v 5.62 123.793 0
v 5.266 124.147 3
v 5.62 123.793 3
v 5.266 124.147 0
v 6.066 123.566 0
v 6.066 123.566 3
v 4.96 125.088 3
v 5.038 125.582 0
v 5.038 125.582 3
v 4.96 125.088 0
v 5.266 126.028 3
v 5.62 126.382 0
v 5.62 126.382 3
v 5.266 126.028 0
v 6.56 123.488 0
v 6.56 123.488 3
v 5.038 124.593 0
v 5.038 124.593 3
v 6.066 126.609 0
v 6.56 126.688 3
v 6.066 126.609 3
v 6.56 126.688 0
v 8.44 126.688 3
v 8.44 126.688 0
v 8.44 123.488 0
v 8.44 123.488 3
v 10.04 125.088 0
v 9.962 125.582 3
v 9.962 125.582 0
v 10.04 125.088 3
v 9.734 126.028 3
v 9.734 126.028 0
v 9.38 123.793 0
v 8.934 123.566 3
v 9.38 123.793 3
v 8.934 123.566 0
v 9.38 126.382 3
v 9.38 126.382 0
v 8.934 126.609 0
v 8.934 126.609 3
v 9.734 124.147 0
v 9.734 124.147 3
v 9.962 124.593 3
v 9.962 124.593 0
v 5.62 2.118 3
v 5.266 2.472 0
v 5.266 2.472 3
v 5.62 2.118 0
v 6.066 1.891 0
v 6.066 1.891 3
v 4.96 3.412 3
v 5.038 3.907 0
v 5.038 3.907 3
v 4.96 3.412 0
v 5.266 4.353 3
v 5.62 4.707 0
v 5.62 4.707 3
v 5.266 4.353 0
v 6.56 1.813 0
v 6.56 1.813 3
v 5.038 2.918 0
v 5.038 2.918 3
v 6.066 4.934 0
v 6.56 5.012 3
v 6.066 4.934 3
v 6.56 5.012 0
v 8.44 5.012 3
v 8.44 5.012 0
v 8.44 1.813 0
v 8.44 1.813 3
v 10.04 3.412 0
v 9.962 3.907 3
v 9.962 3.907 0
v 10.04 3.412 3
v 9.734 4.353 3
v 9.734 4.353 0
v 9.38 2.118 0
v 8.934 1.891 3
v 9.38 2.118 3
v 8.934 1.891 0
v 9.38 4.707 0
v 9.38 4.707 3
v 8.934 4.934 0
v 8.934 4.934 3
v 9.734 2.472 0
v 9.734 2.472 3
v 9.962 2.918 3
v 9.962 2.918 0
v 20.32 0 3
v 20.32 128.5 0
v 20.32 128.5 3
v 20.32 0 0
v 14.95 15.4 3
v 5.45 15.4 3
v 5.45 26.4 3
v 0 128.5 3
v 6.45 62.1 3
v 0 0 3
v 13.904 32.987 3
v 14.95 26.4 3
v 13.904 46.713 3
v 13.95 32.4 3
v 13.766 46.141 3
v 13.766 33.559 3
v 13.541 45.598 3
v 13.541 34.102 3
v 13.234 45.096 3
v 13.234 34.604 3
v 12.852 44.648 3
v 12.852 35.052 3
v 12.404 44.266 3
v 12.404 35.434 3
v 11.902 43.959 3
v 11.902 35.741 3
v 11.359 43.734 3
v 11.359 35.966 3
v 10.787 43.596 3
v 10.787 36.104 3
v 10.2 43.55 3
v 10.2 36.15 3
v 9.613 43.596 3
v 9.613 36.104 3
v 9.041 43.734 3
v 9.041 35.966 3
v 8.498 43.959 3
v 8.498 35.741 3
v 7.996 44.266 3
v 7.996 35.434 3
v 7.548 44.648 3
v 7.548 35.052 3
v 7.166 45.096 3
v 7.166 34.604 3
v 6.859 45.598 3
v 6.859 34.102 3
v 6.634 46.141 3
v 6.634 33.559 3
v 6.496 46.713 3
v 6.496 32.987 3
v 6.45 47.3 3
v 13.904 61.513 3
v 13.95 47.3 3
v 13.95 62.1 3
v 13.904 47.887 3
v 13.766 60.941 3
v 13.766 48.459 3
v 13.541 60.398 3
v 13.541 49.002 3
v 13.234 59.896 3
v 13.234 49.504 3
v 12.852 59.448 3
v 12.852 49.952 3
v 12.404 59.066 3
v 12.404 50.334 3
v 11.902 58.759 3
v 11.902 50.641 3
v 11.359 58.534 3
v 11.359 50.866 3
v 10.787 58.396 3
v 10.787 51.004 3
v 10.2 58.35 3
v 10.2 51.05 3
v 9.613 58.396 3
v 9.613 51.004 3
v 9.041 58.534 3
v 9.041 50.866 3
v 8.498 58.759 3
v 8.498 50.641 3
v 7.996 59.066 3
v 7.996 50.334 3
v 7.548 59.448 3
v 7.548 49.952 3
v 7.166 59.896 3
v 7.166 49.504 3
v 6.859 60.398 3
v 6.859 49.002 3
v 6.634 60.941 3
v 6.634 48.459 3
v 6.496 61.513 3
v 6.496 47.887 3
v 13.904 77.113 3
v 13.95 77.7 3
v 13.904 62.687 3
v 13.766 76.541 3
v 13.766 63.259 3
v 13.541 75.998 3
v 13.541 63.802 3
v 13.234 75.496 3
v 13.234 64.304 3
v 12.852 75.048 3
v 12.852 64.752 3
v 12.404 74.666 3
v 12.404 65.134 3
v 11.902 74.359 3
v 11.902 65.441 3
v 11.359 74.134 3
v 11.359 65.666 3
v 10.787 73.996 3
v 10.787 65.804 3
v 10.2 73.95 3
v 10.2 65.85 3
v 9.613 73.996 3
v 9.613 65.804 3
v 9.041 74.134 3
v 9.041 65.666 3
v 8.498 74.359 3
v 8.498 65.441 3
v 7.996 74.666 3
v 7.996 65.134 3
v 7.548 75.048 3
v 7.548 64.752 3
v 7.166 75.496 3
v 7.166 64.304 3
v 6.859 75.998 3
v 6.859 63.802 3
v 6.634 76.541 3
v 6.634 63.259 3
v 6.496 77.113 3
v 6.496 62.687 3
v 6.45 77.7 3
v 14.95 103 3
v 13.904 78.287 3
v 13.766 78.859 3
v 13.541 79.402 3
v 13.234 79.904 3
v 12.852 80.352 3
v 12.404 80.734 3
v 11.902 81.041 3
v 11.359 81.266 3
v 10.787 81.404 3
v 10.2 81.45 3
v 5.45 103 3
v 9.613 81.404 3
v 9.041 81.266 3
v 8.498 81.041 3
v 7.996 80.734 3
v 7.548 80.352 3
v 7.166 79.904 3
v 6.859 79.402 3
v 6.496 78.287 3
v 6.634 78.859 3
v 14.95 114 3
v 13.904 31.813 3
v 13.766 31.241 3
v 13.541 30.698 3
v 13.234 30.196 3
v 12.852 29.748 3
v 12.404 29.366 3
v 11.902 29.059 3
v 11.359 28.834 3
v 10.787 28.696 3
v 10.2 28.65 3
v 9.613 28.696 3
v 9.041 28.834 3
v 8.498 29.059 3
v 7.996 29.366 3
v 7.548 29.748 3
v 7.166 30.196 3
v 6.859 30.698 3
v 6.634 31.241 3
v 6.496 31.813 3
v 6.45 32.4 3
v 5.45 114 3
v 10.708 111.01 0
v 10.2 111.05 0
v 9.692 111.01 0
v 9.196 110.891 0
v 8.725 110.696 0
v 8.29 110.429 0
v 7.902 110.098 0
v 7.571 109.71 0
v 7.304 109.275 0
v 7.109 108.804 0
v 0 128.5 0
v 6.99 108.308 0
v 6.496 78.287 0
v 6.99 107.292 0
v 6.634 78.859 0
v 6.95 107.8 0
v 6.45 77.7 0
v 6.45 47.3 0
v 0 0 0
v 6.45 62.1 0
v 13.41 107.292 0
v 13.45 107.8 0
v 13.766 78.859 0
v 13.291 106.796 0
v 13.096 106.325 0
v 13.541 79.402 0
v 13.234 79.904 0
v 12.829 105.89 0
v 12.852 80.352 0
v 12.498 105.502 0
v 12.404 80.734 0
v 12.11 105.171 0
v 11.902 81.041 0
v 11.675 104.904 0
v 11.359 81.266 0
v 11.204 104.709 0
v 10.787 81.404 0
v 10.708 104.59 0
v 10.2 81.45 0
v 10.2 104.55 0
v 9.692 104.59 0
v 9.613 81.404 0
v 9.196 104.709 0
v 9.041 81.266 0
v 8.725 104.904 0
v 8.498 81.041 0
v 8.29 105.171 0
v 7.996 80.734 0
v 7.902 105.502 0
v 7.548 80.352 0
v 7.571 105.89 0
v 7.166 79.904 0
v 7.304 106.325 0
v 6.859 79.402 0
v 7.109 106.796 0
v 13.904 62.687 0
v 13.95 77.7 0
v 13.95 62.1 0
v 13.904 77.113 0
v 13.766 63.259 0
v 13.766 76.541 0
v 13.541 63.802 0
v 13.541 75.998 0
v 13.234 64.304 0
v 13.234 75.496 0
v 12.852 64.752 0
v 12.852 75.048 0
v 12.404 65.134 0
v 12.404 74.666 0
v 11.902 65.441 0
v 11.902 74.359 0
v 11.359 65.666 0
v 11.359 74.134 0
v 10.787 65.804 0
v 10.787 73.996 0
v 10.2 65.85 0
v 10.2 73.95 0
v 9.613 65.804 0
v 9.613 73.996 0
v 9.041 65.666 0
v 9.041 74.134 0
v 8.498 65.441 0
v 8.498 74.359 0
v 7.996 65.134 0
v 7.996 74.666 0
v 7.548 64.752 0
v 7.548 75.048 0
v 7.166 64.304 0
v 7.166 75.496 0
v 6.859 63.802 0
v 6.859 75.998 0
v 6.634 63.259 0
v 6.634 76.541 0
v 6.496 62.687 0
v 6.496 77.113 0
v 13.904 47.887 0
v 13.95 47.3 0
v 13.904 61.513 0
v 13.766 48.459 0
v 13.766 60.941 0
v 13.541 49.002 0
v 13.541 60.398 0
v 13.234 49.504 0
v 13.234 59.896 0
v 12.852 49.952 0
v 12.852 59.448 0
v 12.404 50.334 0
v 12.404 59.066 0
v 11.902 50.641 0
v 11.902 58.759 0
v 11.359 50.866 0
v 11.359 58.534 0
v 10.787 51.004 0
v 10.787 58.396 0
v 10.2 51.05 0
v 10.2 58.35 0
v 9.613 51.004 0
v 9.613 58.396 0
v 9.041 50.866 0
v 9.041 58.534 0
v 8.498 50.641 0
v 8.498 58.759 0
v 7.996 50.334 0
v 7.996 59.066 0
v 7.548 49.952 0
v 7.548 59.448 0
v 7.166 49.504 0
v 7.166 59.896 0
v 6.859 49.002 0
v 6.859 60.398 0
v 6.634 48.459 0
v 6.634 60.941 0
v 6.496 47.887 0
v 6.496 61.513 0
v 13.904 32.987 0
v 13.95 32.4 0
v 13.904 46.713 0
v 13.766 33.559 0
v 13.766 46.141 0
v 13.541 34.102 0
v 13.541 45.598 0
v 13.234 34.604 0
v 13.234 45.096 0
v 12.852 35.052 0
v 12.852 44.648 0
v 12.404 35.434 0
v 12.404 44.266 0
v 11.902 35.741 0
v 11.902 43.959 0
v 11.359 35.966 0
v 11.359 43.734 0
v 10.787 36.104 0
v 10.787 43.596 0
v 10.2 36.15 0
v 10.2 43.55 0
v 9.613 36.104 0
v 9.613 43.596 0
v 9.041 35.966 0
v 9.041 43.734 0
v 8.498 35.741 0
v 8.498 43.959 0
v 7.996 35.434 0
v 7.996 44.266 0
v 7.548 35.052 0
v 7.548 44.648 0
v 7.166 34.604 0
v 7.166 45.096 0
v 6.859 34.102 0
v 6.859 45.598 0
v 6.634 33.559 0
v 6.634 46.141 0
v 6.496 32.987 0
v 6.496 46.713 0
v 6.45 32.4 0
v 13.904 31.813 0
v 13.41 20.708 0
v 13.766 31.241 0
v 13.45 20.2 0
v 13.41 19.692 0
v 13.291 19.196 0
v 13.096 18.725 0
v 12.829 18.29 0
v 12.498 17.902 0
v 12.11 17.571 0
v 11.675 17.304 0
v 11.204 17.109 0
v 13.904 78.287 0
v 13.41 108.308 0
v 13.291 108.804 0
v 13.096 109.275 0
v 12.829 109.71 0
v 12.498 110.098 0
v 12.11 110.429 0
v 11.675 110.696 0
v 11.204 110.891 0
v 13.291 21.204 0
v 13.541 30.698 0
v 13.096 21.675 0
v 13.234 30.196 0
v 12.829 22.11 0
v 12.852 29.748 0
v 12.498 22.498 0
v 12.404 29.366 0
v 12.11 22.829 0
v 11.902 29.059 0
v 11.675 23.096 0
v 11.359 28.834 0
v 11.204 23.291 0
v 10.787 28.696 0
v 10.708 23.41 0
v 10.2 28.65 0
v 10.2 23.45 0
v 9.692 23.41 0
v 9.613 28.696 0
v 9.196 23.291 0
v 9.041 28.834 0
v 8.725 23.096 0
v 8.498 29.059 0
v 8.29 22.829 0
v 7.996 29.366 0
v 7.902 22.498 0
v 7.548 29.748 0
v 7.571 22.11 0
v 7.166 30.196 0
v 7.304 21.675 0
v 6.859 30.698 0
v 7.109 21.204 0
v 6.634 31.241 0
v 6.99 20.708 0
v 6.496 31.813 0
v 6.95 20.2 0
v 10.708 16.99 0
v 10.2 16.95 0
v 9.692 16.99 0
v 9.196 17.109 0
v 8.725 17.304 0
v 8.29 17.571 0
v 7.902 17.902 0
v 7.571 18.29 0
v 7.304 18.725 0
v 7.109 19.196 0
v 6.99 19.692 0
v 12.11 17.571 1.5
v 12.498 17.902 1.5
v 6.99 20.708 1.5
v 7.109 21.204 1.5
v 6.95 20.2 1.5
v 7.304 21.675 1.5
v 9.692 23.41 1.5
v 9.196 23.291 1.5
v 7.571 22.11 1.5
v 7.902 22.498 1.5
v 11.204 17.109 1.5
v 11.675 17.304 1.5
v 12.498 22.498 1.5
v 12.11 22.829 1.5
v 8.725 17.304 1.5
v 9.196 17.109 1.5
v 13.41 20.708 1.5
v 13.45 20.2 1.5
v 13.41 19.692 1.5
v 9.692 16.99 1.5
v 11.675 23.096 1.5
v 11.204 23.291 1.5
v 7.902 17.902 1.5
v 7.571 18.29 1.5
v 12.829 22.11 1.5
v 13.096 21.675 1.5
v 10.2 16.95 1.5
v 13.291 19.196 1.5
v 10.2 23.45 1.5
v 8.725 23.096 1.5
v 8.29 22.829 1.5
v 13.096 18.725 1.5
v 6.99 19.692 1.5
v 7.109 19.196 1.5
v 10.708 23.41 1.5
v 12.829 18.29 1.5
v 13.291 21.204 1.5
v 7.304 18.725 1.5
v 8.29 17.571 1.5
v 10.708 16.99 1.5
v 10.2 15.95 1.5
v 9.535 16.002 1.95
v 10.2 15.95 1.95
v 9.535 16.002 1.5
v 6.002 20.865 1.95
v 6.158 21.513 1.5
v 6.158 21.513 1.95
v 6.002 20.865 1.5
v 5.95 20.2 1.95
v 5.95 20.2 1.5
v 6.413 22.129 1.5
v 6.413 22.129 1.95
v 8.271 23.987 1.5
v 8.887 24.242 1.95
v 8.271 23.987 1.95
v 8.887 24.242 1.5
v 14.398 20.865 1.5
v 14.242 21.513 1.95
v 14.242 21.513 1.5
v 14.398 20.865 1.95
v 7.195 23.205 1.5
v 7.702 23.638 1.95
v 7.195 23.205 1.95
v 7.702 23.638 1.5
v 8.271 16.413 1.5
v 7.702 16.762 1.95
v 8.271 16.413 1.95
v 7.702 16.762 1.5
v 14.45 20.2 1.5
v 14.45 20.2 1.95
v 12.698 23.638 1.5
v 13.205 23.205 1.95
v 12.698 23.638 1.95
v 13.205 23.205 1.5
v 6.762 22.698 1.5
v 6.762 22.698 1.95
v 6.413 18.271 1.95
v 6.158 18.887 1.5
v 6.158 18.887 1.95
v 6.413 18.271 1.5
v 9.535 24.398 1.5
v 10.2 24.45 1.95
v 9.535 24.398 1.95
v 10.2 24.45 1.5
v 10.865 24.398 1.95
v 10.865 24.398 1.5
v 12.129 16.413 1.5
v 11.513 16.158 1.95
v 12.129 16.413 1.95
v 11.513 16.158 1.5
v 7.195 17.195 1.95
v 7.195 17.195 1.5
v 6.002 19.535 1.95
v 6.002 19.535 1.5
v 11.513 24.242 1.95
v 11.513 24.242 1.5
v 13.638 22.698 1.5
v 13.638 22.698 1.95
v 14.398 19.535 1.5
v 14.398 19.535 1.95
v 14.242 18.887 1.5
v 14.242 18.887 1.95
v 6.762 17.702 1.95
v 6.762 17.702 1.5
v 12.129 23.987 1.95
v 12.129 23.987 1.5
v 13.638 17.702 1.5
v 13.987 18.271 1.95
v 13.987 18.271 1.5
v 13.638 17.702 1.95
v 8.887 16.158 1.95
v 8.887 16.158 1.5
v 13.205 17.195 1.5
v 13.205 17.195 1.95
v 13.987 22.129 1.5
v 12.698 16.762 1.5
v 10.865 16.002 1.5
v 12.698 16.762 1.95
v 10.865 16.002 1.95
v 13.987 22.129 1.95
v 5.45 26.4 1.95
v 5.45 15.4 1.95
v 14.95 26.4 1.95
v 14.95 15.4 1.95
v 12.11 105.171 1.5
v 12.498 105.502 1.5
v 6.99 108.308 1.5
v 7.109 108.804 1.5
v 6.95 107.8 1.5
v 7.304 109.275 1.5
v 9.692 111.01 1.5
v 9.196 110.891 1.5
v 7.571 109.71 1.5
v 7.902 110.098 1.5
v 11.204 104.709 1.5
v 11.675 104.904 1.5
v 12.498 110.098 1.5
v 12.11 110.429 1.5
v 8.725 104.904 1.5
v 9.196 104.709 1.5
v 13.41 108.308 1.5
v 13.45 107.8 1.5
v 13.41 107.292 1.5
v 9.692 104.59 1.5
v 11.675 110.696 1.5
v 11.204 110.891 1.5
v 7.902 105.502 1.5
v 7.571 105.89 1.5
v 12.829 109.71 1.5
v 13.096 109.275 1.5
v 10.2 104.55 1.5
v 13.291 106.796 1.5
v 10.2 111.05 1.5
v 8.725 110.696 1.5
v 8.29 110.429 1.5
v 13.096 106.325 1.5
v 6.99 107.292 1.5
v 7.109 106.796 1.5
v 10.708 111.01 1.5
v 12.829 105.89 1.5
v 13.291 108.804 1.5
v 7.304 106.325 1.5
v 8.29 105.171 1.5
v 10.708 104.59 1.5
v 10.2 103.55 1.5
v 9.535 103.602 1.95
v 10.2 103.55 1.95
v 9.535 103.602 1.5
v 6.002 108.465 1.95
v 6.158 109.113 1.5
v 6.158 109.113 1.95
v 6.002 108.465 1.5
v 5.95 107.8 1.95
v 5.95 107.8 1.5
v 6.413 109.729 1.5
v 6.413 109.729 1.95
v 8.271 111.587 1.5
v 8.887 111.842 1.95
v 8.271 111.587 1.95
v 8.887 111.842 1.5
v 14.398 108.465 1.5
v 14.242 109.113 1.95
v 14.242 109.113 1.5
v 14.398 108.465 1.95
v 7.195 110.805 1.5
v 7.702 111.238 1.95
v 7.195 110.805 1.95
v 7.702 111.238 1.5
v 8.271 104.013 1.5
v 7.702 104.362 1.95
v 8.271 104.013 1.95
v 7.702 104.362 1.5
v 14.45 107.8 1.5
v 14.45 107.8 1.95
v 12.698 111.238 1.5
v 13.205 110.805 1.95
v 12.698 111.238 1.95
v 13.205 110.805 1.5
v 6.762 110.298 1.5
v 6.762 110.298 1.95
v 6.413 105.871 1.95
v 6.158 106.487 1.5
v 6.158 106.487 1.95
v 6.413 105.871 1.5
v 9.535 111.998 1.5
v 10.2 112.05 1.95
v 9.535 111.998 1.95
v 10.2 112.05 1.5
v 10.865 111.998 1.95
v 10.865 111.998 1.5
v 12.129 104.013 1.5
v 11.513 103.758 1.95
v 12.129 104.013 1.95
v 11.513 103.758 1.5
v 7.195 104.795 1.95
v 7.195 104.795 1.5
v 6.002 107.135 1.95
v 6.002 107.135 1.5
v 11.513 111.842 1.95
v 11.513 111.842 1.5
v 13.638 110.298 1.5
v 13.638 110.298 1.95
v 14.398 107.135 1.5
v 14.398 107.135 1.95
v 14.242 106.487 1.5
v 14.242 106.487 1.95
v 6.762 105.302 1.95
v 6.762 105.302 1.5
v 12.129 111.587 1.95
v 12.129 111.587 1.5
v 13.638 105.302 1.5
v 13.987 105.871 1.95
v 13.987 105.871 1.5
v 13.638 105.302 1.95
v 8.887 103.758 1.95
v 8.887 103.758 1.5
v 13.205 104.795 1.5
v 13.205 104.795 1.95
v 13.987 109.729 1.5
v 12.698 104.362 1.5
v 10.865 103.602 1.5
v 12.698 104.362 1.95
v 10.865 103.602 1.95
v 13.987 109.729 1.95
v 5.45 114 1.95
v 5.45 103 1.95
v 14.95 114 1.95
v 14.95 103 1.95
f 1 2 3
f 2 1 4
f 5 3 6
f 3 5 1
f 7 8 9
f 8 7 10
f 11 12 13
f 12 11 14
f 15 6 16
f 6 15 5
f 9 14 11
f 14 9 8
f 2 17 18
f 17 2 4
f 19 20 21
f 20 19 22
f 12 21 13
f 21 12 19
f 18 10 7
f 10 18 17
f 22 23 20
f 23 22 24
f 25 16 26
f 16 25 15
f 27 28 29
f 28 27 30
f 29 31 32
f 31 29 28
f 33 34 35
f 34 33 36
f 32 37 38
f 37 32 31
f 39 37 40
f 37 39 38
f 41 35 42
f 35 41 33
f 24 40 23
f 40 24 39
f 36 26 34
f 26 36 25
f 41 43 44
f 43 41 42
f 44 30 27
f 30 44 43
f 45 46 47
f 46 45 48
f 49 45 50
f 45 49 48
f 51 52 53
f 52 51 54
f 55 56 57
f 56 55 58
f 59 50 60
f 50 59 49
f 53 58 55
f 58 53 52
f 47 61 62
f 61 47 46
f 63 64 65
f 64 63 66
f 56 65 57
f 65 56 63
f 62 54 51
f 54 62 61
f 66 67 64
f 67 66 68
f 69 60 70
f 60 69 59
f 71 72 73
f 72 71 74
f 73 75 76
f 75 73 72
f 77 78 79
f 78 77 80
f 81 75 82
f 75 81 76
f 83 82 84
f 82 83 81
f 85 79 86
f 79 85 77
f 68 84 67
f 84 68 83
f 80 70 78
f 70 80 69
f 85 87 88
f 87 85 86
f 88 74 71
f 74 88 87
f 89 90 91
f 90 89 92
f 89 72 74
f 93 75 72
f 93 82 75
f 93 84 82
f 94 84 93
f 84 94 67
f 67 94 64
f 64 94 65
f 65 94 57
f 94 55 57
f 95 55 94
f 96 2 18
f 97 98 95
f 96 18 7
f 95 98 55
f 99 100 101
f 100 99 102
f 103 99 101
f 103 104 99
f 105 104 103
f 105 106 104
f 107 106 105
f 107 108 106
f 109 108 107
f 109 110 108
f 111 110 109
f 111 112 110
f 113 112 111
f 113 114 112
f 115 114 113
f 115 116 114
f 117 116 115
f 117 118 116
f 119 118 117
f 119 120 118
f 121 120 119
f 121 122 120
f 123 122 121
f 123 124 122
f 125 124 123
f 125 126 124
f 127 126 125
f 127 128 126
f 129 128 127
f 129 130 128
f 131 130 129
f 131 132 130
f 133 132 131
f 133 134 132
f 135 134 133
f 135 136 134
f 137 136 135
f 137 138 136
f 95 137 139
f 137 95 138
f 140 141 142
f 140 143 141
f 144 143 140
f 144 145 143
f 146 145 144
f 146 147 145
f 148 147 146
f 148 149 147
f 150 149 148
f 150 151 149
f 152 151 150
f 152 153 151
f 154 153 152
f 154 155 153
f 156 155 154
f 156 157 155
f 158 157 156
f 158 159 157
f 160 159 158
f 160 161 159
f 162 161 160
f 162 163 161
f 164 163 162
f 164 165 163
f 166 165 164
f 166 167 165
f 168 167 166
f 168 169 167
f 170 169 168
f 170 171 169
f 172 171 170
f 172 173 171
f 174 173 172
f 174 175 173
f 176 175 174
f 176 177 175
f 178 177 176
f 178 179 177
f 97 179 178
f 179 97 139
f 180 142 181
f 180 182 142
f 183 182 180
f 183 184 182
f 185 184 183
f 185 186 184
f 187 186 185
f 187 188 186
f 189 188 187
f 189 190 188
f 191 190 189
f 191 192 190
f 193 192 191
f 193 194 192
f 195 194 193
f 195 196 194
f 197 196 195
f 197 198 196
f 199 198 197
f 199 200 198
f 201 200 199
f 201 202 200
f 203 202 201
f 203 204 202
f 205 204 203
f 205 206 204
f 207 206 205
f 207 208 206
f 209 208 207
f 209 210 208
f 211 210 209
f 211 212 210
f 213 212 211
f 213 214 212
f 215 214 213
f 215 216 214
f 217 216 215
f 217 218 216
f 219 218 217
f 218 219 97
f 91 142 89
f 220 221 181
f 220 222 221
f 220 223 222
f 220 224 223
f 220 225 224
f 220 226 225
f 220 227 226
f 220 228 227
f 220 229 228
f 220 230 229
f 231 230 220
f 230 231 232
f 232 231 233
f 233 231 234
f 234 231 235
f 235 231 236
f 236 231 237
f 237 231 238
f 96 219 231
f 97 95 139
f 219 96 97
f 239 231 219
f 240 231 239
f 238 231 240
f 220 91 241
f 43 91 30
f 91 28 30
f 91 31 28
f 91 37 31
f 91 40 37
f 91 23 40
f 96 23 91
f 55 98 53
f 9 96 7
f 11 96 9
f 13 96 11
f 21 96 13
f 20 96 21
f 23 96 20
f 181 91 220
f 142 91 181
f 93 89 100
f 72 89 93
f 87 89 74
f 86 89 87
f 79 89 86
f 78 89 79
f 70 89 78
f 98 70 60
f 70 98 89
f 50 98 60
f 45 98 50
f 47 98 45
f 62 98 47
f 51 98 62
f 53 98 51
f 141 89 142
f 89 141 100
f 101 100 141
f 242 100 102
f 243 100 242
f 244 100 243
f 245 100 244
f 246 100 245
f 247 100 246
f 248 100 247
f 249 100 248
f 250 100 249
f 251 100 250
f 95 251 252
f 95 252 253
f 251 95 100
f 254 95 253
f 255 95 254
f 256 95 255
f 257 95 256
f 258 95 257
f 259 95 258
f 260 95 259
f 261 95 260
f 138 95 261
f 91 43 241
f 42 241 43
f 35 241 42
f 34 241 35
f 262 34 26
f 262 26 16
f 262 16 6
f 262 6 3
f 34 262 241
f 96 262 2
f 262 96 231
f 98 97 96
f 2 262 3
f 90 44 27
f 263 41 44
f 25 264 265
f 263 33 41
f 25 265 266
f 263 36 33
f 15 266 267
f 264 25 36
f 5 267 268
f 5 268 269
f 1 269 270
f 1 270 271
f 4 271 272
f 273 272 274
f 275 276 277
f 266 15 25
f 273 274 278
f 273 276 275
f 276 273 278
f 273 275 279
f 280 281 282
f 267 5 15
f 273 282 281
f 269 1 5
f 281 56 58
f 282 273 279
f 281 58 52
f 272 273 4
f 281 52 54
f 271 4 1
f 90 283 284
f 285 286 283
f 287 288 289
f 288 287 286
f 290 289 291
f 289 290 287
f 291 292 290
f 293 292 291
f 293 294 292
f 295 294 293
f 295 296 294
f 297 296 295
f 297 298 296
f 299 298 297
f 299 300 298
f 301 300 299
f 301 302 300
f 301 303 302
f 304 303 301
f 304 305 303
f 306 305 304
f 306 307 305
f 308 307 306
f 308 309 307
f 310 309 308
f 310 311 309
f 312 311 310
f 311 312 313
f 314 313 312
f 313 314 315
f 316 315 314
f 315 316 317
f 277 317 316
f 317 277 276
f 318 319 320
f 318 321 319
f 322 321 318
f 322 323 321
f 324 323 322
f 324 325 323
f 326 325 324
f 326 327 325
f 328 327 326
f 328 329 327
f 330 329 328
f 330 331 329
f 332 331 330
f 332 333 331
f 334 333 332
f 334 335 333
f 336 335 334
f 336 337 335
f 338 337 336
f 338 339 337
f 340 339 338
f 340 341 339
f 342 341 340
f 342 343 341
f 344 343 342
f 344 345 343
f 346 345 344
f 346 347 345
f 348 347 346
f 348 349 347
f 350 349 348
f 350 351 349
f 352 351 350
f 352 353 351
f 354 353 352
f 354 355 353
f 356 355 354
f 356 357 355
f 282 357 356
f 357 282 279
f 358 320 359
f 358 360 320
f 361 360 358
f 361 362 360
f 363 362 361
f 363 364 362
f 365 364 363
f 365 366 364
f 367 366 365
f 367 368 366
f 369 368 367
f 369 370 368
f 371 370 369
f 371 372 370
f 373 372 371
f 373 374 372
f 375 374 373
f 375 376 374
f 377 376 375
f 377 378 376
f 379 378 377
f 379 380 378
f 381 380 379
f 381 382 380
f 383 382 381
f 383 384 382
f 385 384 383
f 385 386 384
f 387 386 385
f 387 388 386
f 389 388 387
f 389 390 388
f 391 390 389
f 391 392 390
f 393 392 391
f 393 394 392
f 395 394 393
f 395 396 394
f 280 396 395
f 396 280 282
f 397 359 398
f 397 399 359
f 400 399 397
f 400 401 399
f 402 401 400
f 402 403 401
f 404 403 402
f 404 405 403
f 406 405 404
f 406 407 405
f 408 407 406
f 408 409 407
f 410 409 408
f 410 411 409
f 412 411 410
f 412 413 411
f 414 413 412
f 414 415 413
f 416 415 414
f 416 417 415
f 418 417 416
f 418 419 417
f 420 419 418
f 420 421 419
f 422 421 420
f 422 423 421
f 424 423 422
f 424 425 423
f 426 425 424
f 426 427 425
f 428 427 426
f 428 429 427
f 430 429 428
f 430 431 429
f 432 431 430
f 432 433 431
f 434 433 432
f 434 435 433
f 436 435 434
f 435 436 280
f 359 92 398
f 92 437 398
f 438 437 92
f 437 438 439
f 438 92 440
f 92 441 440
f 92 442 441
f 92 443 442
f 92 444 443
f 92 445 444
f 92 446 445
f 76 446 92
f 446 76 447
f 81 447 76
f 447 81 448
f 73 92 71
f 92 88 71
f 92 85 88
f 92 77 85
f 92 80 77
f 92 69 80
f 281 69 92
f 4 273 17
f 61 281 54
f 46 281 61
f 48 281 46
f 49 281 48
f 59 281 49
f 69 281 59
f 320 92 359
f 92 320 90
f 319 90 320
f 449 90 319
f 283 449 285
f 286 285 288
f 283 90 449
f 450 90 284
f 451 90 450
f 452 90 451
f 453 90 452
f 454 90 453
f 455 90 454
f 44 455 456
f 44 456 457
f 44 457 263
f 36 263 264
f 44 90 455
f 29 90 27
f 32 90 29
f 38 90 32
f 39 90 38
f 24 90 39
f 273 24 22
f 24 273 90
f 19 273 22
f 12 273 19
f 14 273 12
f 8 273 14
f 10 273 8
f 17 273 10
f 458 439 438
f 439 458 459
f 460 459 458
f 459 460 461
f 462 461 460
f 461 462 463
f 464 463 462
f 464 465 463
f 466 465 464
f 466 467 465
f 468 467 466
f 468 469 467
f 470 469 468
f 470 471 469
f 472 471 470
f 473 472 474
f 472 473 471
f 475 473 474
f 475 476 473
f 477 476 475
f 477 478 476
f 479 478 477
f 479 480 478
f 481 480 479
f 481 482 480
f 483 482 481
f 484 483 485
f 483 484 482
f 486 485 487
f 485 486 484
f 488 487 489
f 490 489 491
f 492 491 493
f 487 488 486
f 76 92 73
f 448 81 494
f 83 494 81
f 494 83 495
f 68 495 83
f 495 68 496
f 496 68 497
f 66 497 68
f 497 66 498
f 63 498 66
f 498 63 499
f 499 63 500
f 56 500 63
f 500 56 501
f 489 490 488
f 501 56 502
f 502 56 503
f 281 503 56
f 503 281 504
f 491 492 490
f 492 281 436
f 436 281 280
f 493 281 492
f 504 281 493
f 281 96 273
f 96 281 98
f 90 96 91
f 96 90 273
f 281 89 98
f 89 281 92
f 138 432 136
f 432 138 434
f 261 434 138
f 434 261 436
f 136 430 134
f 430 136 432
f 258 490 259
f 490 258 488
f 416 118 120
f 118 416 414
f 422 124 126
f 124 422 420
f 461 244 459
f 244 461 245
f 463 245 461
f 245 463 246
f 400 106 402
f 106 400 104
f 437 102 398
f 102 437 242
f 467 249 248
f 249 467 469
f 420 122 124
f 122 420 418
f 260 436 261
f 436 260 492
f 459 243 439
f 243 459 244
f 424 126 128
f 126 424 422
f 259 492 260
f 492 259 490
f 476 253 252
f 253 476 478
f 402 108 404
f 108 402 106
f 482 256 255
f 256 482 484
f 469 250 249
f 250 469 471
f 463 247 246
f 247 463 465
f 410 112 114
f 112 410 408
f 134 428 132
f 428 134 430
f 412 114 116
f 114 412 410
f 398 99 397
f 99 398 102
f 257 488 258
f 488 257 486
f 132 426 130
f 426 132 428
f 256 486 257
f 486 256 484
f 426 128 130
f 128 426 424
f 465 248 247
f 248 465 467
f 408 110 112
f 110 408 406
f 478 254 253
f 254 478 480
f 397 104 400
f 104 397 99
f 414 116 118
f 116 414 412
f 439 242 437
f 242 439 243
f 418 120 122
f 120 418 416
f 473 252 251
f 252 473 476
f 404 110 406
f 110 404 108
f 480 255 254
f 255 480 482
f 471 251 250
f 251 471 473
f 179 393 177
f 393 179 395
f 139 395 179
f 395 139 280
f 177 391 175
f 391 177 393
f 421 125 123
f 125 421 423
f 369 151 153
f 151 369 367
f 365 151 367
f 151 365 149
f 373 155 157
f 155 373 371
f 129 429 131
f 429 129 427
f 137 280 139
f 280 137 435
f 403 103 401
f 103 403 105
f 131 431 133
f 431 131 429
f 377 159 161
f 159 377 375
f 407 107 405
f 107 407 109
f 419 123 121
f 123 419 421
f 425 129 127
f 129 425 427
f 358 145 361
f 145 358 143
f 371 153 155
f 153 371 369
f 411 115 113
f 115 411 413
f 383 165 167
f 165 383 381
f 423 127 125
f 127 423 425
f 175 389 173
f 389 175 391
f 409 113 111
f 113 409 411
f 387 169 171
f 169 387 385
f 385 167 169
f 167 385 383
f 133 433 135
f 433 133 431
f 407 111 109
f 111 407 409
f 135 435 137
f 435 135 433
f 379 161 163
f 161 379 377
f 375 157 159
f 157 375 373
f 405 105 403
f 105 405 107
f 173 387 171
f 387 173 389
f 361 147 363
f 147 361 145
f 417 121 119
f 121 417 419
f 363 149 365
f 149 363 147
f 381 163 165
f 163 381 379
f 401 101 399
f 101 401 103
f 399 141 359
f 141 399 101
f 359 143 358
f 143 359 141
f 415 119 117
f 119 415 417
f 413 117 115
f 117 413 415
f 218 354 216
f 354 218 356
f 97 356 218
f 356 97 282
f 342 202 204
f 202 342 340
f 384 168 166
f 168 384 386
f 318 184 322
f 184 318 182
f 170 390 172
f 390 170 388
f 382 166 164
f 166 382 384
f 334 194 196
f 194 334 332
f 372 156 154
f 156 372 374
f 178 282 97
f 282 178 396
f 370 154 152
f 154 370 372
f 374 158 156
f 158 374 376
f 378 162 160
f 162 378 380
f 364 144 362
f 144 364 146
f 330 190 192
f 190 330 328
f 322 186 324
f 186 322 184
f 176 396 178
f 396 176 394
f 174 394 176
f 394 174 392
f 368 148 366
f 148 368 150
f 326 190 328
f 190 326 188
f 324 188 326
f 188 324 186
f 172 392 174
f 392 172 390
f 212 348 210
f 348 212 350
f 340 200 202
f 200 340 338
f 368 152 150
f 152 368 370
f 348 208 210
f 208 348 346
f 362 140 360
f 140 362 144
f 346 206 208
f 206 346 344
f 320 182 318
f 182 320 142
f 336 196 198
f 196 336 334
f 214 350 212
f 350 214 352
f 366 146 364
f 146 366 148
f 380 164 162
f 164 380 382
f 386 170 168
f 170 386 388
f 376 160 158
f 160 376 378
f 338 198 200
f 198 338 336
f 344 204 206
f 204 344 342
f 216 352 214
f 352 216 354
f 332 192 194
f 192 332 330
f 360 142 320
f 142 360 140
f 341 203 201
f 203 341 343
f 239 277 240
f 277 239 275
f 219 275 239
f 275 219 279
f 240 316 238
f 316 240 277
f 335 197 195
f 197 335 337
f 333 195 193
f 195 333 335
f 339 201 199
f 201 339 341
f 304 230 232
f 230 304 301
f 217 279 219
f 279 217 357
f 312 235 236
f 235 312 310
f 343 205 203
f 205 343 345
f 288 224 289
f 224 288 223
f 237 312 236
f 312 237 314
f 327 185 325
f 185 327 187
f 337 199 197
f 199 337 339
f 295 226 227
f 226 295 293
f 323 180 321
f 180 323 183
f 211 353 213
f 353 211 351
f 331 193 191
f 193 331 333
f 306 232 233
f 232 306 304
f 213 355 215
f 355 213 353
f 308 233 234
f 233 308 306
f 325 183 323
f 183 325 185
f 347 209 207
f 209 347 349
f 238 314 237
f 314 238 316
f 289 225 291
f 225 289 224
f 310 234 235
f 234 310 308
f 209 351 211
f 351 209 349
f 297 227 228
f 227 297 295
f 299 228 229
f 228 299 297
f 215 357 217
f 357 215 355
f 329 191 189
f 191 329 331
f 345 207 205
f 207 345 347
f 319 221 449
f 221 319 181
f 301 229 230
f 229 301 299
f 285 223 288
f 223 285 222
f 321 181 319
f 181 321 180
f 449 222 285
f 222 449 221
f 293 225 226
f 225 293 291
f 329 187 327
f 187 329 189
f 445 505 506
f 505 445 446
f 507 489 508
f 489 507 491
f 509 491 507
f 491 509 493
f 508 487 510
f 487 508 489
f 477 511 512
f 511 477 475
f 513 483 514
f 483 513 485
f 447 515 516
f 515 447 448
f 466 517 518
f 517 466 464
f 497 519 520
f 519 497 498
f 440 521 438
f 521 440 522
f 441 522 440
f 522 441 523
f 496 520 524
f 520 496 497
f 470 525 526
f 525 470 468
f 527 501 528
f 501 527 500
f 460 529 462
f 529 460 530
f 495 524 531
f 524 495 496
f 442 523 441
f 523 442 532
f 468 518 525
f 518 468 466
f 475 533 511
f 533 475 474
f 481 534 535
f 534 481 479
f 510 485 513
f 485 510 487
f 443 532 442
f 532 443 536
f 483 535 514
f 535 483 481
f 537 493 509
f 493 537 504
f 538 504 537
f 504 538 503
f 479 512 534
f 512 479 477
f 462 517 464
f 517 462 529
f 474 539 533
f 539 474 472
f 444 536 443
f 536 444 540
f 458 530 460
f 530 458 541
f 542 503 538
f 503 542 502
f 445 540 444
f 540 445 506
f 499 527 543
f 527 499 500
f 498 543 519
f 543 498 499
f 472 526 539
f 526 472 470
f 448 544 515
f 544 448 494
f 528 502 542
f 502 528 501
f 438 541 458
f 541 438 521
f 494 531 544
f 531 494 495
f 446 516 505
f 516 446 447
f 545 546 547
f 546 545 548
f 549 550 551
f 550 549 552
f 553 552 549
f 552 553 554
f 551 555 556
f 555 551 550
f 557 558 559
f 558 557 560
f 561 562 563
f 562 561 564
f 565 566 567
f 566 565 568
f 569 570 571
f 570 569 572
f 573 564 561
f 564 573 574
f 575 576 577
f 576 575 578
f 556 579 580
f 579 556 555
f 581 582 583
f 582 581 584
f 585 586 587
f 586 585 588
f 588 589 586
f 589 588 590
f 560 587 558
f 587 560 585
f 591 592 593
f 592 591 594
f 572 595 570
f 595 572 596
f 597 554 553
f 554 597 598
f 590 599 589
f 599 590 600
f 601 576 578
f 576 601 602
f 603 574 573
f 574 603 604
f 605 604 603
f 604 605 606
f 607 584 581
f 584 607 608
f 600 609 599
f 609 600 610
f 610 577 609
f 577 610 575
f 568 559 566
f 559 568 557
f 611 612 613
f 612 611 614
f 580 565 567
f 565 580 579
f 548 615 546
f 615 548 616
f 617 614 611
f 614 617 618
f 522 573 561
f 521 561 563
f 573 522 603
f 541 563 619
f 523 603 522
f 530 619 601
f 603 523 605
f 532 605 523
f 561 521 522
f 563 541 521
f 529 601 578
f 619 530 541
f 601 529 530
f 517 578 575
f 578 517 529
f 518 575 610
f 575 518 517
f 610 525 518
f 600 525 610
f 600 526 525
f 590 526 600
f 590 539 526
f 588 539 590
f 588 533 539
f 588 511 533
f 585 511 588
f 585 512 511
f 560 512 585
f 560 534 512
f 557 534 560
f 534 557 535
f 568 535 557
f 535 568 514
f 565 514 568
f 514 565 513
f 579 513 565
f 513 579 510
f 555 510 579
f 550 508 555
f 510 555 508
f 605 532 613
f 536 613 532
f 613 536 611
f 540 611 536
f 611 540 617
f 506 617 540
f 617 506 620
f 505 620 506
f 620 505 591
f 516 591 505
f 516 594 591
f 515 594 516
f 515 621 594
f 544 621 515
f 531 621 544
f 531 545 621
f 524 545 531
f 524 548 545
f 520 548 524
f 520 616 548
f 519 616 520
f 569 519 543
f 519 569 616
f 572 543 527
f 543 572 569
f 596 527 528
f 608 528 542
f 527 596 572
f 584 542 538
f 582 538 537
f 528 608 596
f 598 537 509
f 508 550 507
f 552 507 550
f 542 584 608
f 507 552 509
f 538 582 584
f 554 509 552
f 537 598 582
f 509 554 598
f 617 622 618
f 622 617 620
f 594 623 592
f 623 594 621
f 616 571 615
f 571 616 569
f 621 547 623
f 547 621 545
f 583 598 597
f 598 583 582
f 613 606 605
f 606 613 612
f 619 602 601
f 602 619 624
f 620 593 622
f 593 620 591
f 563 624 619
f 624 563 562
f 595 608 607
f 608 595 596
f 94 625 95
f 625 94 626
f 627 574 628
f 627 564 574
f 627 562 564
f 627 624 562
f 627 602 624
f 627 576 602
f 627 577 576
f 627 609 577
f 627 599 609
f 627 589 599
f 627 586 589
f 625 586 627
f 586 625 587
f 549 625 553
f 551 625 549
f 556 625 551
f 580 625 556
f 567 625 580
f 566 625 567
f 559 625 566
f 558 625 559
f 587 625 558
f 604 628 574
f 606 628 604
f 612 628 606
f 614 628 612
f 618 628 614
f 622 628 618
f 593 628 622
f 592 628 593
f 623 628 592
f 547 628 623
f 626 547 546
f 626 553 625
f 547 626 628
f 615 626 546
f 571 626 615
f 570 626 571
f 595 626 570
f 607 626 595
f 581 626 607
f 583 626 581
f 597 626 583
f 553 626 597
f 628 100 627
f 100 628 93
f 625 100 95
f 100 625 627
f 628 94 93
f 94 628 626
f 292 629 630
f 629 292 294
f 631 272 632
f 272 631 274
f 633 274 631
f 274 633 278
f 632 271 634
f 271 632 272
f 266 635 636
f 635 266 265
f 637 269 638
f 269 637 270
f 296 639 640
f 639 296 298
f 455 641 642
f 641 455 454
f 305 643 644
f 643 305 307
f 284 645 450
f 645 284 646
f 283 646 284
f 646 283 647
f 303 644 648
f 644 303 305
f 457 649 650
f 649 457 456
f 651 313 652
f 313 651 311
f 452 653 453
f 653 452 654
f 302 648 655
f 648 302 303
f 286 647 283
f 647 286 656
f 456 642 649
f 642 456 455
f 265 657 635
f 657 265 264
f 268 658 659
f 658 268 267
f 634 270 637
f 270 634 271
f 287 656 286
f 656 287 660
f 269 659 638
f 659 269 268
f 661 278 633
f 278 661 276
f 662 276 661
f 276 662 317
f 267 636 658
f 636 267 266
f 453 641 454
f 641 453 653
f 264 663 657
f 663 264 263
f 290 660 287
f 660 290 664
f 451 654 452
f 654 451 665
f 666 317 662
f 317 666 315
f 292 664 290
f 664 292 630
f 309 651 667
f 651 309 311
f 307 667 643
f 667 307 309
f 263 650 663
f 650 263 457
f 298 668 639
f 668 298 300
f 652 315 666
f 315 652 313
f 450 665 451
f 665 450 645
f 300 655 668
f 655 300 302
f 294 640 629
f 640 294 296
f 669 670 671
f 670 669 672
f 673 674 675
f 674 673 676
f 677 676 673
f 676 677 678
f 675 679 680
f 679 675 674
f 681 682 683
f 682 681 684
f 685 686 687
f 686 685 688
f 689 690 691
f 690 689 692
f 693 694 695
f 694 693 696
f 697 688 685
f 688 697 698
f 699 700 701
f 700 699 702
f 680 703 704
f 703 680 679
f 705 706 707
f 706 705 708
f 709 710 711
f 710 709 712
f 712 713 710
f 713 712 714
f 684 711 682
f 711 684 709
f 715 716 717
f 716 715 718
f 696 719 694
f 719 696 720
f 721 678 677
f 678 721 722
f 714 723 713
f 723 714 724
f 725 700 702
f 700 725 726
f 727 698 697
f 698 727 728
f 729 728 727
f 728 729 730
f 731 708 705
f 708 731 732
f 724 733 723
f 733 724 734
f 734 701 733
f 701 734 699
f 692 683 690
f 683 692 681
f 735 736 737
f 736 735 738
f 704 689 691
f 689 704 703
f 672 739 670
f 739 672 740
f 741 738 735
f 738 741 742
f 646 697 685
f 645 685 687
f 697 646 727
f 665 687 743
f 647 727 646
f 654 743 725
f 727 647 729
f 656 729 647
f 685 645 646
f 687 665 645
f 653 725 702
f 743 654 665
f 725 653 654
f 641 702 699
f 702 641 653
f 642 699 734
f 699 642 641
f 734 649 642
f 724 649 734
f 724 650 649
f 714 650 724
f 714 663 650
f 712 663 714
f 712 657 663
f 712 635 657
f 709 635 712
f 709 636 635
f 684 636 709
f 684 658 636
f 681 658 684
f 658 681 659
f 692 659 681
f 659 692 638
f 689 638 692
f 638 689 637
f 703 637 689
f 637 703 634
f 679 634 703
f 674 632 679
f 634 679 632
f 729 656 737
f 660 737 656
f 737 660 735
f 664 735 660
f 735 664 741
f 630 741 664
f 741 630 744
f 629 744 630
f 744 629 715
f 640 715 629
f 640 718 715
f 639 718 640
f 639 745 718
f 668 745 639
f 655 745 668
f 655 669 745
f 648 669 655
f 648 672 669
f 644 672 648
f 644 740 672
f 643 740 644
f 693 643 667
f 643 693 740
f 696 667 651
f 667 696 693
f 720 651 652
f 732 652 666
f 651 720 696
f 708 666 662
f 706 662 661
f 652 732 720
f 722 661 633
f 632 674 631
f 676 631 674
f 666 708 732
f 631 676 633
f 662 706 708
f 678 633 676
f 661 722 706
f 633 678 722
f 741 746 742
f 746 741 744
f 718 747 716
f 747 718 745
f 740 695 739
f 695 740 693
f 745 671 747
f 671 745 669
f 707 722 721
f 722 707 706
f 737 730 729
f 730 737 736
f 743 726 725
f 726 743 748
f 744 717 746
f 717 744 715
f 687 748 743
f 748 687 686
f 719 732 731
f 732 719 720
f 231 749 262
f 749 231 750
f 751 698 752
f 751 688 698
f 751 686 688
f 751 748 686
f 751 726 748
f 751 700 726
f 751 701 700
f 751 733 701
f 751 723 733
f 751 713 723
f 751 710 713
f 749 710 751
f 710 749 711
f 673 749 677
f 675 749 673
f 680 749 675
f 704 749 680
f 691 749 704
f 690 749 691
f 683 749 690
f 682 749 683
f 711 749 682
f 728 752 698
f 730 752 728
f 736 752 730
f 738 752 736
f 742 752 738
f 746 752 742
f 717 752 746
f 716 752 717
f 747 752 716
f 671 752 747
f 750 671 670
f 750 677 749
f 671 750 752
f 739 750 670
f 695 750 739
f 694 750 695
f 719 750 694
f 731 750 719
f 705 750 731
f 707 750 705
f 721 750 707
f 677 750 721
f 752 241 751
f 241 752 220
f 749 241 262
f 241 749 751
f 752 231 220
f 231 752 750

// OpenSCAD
// file: eurorack-lib/eurorack-lib.scad
include <constants.scad>

// how wide the holes should be
holeWidth = 5.08;
mountHoleDiameter = 3.2; // M3

hwCubeWidth = holeWidth - mountHoleDiameter;
mountHoleRad = mountHoleDiameter/2;
mountHoleXMargin = 7.5; // http://www.doepfer.de/a100_man/a100m_e.htm
panelInnerHeight = 110; //rail clearance = ~11.675mm, top and bottom
railHeight = (threeUHeight-panelOuterHeight)/2;
mountSurfaceHeight = (panelOuterHeight-panelInnerHeight-railHeight*2)/2;
offsetToMountHoleCenterY = mountSurfaceHeight/2;
mountHoleDepth = panelThickness+2;


module eurorackPanel(panelHp, mountHoles=4) {
  //mountHoles ought to be even. Odd values are -=1
  difference() {
    cube([hp*panelHp,panelOuterHeight,panelThickness]);

    holes = mountHoles-mountHoles%2; //mountHoles ought to be even for the sake of code complexity. Odd values are -=1
    offsetToMountHoleCenterX = mountHoleXMargin - hwCubeWidth/2;
    // Iteratively calc this since I'm tired and can't do math right now. Point is that since
    // Doepfer says 7.5 from left side, we can't use same offset from the right side since not a multiple of hp
    // See http://www.doepfer.de/a100_man/a100m_e.htm
    rightMountHoleOffsetX = offsetToMountHoleCenterX+hp*(panelHp-3);


    //topleft
    translate([offsetToMountHoleCenterX,panelOuterHeight-offsetToMountHoleCenterY,0])
      eurorackMountHole();
    translate([offsetToMountHoleCenterX,offsetToMountHoleCenterY,0])
      eurorackMountHole();


    if(holes>2) {
      //topRight
      translate([rightMountHoleOffsetX,panelOuterHeight-offsetToMountHoleCenterY,0])
        eurorackMountHole();

      //bottomRight
      translate([rightMountHoleOffsetX,offsetToMountHoleCenterY,0])
          eurorackMountHole();
    }
  }
}

module eurorackMountHole() {
    mountHoleDepth = panelThickness+2; //because diffs need to be larger than the object they are being diffed from for ideal BSP operations
    if(hwCubeWidth<0) {
      hwCubeWidth=0;
    }
    translate([0,0,-1]) {
      cylinder(r=mountHoleRad, h=mountHoleDepth, $fn=20);
      translate([0,-mountHoleRad,0])
        cube([hwCubeWidth, mountHoleDiameter, mountHoleDepth]);
      translate([hwCubeWidth,0,0])
        cylinder(r=mountHoleRad, h=mountHoleDepth, $fn=20);
    }
}

module walls(panelHp) {
  width = panelHp * hp;
  straightY=20;
  straightY2=10;
  angleY=5;
  angleX=2;
  thickness = 2;
  leftPath = [
    [0, 0],
    [thickness, 0],
    [thickness, straightY],
    [thickness + angleX, straightY + angleY],
    [thickness + angleX, straightY + straightY2  + angleY-thickness],
    /*[thickness, straightY + angleY * 3 - thickness],
    [thickness, straightY*2 + angleY * 3],
    [0, straightY*2 + angleY * 3],
    [0, straightY + angleY * 3 - thickness],*/
    [angleX, straightY+straightY2 + angleY - thickness],
    [angleX, straightY + angleY],
    [0, straightY]
  ];

  straightYOtherSide=15;
  rightPath = [
    [0, 0],
    [thickness, 0],
    [angleX, straightYOtherSide],
    [0, straightYOtherSide]
  ];

  wallYMarginPerSide = 10;
  wallY = panelOuterHeight - wallYMarginPerSide*2;

  translate([0, panelOuterHeight - wallYMarginPerSide, panelThickness-0.1]) {
    rotate([90, 0, 0]) {
      linear_extrude(height=wallY) polygon(points=leftPath);
      translate([width-thickness, 0, 0]) {
        linear_extrude(height=wallY) polygon(points=rightPath);
      }
    }
  }
}

 
// Square and cirular cutout to make the protrude a bit more
// I have a big batch of defective ones with short threads so need that extra
module PJ301() {
  jackHoleDiam = 6.5;

  translate([0, 0, -0.01])
    cylinder(d=jackHoleDiam, h=mountHoleDepth+2, $fn=40);
  translate([0, 0, panelThickness-1.5])
    cylinder(d=8.5, h=1.4, $fn=40);

  extra_cutting_upwards = 10;
  translate([0, 0.7, panelThickness + extra_cutting_upwards/2])
    cube([9.5, 11, 2.1 + extra_cutting_upwards], true);
}

// The cheap larger pots
module AlphaPot() {
  potHoleDiam = 7.5;
  translate([0, 0, -0.01])
    cylinder(d=potHoleDiam, h=mountHoleDepth+2, $fn=40);
}

module RV09Pot() {
  potHoleDiam = 7;
  translate([0, 0, -0.01])
    cylinder(d=potHoleDiam, h=mountHoleDepth+2, $fn=40);
}

module ThreeMmLed() {
  translate([0, 0, -0.01])
    cylinder(d=3.4, h=mountHoleDepth+2, $fn=40);
}
// file: eurorack-lib/constants.scad
hp = 5.08;
threeUHeight = 133.35; //overall 3u height
panelOuterHeight =128.5;

// Should be 2mm, but 2.5 makes for lots of room for squish and sanding
// panelThickness = 2.5;
panelThickness = 3;
// main file
include <eurorack-lib/constants.scad>
use <eurorack-lib/eurorack-lib.scad>

panelHp = 4;
width = hp * panelHp;
middle = width / 2;

jacks = [
  [0, 50.2],
  [0, 137.8],
];

pots = [
  [0, 62.4],
  [0, 77.3],
  [0, 92.1],
  [0, 107.7],
];

module holes() {
  translate([0.3, 115, 0])
  mirror([0, 1, 0]) {
    for(hole = pots)
      translate([hole[0], hole[1]])
        AlphaPot();
    for(hole = jacks)
      translate([hole[0], hole[1]])
        PJ301();
  }
}


module reinforcements() {
    reinforcement_width = 1;
    reinforcement_height = 7;

    translate([middle-reinforcement_width/2, 10, 0]) {
      cube([reinforcement_width, 108, reinforcement_height]);
      translate([-6, 0, 0])
        cube([reinforcement_width, 68, reinforcement_height]);
      translate([6, 0, 0])
        cube([reinforcement_width, 68, reinforcement_height]);
      translate([19.5, 0, 0])
        cube([reinforcement_width, 108, reinforcement_height]);
      translate([-19.5, 0, 0])
        cube([reinforcement_width, 108, reinforcement_height]);
    }
}

difference() {
  union() {
    eurorackPanel(panelHp, 2);
    // walls(panelHp);
    // reinforcements();
  }
  translate([10.5, 85, 0])
  rotate([0, 0, 180])
    holes();
}
